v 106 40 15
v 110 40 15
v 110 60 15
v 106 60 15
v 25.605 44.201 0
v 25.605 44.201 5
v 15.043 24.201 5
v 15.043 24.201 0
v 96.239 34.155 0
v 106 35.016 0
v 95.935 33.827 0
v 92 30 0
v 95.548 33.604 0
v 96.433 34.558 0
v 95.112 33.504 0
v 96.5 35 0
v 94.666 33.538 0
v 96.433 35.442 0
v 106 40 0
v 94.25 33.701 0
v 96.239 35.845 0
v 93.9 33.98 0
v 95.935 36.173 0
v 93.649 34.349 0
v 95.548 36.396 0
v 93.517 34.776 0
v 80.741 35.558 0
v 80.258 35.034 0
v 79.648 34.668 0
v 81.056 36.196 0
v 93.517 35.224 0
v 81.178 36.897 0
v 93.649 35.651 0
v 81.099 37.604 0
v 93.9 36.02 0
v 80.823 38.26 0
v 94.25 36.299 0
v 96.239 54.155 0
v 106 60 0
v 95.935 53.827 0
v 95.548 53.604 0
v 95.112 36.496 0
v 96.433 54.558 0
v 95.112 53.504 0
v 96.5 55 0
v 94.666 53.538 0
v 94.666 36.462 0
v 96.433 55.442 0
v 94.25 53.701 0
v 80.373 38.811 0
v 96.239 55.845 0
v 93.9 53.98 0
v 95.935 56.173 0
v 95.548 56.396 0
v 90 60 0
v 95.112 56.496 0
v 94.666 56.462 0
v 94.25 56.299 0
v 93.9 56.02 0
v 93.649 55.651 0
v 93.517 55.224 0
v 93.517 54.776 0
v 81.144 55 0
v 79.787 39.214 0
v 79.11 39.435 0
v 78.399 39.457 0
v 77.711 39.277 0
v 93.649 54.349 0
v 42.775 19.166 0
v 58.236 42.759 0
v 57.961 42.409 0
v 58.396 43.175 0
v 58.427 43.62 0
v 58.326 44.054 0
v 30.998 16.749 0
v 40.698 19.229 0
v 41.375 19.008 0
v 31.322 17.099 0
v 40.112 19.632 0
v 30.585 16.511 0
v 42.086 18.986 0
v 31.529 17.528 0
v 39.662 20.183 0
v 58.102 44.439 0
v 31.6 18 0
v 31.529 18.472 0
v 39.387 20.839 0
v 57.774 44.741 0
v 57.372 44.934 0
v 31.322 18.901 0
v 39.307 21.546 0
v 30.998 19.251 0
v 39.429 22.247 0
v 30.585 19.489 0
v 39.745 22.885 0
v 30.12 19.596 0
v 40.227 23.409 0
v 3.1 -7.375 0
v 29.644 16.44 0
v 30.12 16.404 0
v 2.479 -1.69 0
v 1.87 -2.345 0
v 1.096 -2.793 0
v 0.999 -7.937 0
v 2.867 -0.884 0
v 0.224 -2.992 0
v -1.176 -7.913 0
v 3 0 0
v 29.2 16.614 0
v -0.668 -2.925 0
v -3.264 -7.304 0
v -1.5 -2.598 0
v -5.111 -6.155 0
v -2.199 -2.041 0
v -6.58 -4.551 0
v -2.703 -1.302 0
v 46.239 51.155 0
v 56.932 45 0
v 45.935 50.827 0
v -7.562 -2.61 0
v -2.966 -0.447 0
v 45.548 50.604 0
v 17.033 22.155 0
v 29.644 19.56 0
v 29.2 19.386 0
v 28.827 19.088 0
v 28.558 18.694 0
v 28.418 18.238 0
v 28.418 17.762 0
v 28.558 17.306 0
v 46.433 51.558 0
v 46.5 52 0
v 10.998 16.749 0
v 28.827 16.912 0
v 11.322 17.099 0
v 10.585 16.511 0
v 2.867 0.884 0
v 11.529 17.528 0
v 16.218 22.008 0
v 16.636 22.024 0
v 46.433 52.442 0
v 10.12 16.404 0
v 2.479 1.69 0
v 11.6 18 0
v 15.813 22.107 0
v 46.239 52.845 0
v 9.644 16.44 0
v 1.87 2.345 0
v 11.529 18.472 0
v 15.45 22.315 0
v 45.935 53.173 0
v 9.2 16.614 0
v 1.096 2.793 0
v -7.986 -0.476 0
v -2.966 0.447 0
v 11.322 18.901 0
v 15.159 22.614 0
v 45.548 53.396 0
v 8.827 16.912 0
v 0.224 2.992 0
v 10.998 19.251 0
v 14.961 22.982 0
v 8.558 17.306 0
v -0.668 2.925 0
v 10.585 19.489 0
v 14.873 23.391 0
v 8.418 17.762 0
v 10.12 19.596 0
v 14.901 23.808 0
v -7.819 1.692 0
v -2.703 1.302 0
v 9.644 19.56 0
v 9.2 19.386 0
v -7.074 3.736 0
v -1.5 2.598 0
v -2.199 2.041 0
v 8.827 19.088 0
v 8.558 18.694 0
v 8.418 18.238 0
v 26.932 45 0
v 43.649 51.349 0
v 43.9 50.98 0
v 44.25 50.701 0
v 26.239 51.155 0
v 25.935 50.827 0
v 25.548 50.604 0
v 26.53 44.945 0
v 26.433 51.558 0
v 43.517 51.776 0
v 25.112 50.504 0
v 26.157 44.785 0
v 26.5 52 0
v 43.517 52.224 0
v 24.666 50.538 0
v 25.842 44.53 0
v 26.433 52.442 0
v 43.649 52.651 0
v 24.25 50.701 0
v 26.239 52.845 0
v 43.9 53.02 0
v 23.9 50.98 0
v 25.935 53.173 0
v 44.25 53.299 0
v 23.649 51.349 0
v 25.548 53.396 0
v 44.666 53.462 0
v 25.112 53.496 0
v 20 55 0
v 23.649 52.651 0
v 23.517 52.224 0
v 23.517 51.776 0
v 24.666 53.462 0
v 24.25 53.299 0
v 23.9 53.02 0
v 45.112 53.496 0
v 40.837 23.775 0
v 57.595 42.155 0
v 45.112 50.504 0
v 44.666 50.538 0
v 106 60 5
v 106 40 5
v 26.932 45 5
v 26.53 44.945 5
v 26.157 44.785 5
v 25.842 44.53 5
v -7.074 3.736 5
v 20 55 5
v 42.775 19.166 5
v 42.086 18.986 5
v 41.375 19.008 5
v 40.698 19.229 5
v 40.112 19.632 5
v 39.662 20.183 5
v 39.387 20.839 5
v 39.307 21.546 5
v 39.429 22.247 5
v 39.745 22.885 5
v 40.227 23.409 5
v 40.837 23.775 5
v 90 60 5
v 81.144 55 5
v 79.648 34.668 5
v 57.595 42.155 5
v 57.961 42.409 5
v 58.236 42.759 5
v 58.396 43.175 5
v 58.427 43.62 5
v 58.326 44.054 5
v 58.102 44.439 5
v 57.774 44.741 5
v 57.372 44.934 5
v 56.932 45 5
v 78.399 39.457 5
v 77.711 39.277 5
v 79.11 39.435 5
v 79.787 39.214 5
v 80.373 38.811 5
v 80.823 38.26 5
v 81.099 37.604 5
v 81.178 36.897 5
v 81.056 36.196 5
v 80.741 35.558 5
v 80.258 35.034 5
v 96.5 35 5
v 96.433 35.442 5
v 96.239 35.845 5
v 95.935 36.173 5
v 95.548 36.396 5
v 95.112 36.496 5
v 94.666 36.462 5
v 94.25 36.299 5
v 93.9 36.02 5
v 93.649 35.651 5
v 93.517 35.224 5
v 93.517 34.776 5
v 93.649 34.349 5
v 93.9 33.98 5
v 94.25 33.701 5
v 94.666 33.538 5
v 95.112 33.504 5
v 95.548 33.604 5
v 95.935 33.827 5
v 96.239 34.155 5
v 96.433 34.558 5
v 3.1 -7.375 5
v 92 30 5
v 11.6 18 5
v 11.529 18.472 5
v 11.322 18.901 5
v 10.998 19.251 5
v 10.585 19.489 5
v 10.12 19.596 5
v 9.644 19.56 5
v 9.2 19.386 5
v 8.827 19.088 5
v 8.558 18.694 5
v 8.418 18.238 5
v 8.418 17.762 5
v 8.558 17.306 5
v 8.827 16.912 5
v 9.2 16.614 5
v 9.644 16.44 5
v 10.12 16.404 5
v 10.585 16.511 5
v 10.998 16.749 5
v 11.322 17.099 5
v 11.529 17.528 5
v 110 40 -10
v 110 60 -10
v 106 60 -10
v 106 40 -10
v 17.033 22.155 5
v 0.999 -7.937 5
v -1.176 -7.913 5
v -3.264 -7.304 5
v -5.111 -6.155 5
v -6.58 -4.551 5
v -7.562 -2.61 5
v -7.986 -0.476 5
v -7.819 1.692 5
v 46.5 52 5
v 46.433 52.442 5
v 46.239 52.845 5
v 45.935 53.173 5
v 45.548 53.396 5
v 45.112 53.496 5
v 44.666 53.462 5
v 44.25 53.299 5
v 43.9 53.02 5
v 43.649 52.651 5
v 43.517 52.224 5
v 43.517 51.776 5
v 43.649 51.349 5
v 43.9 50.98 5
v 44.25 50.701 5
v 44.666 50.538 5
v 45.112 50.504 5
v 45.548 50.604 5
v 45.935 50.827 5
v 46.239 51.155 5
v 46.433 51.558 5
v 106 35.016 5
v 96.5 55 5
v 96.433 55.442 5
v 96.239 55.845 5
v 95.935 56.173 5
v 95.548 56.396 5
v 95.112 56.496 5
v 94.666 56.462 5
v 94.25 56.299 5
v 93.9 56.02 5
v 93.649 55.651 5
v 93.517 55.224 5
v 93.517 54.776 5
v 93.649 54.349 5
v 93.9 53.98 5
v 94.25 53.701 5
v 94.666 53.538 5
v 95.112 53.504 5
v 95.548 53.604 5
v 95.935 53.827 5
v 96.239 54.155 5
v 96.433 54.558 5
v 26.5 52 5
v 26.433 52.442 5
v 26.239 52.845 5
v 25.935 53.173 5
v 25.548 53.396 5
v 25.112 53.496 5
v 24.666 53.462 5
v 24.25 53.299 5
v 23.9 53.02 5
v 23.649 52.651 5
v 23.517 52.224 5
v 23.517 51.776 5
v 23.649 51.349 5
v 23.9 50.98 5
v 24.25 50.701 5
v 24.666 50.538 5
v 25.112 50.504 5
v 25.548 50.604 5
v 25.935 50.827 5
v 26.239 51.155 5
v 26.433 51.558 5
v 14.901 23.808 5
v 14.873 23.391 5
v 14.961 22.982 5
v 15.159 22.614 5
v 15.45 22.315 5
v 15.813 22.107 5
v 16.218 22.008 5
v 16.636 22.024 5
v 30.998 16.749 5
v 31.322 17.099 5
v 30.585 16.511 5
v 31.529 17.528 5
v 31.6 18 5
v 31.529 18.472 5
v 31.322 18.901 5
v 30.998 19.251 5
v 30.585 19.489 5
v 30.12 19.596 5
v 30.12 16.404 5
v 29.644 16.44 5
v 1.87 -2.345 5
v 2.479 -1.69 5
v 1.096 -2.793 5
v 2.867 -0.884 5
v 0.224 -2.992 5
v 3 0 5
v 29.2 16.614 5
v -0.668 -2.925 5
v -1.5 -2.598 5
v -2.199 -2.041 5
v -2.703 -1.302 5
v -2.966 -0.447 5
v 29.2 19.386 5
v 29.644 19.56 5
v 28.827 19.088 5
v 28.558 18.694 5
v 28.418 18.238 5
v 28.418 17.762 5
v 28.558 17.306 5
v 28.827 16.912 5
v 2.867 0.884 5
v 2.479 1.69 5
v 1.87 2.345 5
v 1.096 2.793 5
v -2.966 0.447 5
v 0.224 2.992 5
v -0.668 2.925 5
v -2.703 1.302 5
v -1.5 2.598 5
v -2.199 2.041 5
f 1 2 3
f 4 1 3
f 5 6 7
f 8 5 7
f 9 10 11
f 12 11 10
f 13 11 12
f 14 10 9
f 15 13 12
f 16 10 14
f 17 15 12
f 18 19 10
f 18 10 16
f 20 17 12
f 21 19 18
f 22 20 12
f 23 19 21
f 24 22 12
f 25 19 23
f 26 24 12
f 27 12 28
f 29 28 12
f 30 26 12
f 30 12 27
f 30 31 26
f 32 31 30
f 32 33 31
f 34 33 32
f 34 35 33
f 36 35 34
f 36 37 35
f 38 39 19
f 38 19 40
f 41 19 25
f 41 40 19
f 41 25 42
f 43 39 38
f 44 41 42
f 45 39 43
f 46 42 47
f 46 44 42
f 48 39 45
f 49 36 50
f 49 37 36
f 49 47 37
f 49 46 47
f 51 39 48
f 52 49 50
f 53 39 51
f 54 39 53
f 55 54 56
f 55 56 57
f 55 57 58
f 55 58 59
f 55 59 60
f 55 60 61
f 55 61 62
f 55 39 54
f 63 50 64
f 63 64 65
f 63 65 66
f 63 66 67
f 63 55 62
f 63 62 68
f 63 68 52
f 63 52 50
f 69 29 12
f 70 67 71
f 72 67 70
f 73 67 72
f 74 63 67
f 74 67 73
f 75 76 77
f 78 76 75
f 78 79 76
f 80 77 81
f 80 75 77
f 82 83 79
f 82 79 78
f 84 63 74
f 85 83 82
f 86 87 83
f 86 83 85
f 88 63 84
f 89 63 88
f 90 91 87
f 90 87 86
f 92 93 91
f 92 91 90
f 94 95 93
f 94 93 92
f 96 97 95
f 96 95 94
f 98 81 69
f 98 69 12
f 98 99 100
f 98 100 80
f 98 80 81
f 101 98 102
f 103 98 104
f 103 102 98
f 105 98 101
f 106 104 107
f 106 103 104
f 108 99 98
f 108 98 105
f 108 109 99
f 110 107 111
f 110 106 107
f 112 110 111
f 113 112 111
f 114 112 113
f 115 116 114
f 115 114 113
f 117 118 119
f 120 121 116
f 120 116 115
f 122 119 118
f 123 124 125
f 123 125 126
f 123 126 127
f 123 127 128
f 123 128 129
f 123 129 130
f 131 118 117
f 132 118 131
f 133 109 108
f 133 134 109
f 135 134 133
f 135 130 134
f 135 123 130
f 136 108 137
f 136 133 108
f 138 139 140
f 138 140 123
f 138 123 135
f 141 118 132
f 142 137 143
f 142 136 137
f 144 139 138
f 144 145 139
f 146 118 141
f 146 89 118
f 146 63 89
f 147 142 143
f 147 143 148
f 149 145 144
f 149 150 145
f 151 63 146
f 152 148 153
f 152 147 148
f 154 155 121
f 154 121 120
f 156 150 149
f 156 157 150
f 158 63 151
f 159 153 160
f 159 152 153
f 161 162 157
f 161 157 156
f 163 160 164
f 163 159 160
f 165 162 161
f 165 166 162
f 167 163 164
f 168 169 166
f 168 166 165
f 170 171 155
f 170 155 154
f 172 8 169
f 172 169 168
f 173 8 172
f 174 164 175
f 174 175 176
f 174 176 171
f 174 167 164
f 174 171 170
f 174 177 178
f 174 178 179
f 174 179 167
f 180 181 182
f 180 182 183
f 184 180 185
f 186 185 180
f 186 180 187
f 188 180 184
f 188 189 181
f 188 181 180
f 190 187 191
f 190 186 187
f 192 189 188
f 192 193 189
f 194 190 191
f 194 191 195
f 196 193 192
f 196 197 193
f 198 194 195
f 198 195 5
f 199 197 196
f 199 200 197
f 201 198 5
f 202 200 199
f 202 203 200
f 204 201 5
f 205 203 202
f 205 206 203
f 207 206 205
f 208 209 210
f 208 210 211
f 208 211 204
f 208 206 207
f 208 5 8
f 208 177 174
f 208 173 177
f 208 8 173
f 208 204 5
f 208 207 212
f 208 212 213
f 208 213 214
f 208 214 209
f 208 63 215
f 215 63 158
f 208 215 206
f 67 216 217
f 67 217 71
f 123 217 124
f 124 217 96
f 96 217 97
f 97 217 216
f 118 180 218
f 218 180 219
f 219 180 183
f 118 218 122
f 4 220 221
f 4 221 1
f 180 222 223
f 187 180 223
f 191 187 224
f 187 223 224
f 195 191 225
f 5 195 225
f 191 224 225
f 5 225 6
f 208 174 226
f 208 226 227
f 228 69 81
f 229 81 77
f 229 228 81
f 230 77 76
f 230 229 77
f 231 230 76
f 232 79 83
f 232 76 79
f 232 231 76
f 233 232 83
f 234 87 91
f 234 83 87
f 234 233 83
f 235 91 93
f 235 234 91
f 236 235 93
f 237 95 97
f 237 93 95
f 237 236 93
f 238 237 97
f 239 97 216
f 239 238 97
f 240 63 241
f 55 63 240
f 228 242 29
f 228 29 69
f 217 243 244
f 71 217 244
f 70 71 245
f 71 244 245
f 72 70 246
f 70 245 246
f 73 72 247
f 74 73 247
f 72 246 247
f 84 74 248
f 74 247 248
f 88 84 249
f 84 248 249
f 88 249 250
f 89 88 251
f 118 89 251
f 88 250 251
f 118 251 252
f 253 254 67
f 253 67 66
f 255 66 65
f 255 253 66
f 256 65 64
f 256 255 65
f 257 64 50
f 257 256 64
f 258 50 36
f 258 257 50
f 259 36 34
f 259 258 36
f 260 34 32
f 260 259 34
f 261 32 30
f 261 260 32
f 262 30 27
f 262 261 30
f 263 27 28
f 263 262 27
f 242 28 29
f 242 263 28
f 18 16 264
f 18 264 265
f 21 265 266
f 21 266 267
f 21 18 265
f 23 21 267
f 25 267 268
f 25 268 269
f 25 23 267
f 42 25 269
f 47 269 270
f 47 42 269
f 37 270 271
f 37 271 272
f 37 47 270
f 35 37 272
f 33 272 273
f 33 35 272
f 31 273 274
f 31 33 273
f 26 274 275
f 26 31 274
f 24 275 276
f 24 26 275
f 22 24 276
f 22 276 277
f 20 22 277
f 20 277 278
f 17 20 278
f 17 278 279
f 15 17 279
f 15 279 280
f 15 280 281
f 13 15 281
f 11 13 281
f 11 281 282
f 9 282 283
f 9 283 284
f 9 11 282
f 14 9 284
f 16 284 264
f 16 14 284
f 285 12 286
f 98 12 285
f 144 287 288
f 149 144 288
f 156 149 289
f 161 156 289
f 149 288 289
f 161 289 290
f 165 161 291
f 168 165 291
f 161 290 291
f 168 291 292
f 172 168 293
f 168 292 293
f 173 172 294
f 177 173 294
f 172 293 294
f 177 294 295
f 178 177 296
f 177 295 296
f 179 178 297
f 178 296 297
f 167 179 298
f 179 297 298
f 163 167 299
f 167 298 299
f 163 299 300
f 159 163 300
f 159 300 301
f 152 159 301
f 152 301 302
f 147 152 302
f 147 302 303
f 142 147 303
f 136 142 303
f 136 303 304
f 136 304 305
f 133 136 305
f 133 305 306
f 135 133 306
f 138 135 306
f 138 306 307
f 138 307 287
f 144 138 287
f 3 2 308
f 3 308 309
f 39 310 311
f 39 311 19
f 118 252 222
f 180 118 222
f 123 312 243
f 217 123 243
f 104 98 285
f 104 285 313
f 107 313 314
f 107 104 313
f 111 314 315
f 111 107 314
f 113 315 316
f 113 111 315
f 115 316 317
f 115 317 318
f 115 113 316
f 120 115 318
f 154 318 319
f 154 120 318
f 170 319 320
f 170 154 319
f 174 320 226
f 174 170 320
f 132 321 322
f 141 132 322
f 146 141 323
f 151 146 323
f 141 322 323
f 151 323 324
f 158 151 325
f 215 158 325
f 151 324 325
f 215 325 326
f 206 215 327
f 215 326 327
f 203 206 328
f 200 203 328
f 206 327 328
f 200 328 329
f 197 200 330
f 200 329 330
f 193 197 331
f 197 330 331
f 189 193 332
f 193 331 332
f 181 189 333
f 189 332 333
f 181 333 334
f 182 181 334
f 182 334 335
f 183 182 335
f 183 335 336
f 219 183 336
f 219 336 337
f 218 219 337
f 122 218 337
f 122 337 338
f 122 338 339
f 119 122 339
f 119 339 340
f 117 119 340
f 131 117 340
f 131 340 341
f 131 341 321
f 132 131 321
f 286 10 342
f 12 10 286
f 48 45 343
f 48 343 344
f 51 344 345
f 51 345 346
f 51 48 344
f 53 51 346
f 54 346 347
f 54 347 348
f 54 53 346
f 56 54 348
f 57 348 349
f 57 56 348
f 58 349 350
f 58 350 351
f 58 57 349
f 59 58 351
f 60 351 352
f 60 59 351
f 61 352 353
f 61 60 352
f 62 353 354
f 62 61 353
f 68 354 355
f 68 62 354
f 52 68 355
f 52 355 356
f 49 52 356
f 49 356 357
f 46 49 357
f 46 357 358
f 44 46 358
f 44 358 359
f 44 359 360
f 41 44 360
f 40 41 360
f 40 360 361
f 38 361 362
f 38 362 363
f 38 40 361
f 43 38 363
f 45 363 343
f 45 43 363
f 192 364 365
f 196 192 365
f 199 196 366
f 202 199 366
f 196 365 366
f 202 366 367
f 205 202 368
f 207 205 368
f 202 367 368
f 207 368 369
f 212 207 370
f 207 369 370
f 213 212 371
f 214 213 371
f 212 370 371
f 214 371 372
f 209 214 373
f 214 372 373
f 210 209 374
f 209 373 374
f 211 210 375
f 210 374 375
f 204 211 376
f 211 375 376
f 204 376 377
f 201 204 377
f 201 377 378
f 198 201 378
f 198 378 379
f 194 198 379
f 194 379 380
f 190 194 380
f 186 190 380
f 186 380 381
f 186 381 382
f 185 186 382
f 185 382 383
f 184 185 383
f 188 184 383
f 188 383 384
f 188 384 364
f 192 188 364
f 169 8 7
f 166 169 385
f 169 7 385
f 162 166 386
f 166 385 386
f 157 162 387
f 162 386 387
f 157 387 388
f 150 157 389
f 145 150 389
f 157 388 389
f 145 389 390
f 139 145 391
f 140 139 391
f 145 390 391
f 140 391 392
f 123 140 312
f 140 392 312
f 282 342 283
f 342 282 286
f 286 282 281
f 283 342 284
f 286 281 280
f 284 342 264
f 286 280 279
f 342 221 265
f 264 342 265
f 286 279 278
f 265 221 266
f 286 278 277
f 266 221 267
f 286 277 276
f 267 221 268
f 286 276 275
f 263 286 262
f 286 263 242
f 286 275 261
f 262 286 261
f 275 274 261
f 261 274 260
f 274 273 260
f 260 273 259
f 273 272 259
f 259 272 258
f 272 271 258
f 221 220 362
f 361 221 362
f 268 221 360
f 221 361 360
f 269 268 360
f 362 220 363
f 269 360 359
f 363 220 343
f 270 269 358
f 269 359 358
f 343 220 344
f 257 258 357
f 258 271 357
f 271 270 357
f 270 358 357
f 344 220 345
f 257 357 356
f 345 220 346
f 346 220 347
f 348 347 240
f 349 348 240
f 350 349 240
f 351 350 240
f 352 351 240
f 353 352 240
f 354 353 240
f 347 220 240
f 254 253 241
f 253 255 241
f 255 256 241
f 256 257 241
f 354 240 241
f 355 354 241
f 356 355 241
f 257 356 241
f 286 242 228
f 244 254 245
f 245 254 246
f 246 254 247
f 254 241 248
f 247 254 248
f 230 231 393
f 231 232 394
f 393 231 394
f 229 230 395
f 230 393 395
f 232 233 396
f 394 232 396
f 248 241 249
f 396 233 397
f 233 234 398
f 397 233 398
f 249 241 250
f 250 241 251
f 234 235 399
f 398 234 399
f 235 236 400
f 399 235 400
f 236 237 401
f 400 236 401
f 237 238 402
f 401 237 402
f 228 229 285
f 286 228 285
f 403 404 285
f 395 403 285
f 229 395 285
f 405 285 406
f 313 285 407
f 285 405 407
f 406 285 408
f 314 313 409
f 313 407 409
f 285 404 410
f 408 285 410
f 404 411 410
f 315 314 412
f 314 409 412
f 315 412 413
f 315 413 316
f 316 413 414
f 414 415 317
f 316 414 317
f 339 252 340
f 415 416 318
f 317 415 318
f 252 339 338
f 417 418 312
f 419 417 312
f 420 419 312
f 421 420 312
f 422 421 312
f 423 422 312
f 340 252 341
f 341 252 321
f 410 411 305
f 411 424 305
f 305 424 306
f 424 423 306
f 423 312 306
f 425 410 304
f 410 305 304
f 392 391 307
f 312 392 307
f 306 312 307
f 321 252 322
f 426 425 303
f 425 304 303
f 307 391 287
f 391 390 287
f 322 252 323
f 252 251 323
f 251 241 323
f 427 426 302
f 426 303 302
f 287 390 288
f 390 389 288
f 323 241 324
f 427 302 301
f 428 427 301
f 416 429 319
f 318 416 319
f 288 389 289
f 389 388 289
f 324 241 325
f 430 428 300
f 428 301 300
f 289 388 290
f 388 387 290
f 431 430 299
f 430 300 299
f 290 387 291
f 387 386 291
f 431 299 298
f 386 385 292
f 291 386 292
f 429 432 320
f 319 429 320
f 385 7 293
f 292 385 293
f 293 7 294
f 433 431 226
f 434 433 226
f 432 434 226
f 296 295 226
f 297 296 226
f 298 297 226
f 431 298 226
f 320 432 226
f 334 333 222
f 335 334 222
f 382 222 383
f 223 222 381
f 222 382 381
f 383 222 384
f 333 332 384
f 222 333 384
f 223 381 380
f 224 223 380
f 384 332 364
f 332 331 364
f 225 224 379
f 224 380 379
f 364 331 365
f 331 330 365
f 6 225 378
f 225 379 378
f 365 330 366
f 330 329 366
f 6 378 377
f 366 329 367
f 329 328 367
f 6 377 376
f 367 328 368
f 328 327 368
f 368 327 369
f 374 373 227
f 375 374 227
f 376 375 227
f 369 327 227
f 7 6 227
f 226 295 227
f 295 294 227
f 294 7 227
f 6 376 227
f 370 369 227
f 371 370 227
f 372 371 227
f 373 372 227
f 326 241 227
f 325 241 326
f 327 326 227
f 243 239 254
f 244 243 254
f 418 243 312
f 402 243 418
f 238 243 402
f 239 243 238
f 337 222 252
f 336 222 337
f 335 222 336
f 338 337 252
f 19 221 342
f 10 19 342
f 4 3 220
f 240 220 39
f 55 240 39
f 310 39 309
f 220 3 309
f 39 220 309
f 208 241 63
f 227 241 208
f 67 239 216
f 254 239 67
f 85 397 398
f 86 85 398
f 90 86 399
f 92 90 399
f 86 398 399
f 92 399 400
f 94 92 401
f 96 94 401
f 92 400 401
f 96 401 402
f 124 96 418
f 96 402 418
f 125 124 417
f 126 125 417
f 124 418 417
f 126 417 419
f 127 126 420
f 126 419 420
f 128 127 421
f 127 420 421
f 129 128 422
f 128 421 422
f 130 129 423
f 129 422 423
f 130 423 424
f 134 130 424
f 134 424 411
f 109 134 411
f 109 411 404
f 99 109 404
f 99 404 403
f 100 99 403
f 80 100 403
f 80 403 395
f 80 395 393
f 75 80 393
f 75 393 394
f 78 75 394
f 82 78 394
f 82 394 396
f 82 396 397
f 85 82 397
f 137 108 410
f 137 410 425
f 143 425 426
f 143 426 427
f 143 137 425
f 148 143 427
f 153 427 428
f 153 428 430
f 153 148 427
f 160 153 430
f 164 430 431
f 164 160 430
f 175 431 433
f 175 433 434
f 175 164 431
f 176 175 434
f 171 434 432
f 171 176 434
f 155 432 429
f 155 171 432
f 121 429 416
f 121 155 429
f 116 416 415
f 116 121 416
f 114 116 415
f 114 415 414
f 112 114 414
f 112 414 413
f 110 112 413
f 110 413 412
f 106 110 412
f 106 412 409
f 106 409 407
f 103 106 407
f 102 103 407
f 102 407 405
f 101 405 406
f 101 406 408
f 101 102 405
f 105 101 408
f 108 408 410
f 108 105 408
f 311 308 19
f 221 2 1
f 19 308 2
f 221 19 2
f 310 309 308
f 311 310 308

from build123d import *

# Parameters (mm, degrees)
SKETCH_1_R               = 3
SKETCH_1_R_2             = 1.5
EXTRUDE_1_DEPTH          = 5
EXTRUDE_2_DEPTH          = 5
SKETCH_4_R               = 1.5
CUT_EXTRUDE_1_DEPTH      = 144.265487819
EXTRUDE_START            = -5
EXTRUDE_3_DEPTH          = 5
CUT_EXTRUDE_2_DEPTH      = 144.265487819
SKETCH_7_R               = 1.6
CUT_EXTRUDE_3_DEPTH      = 144.265487819
EXTRUDE_4_DEPTH          = 24
CUT_EXTRUDE_4_DEPTH      = 10
CUT_EXTRUDE_4_DEPTH_BACK = 144.961800489
CUT_EXTRUDE_5_DEPTH      = 144.961800489
SKETCH_14_W              = 9.91097982
SKETCH_14_H              = 20
SKETCH_14_W_2            = 10.08902018
CUT_EXTRUDE_7_DEPTH      = 146.344418537


with BuildPart() as part:
    # 草图1 → 凸台-拉伸1 (new body)
    with BuildSketch(Plane.XY):
        with BuildLine():
            Line((-3.933140204, 6.966376973), (90, 60))
            Line((90, 60), (130, 60))
            Line((130, 60), (130, 30))
            Line((130, 30), (92, 30))
            Line((92, 30), (3.100465808, -7.374761811))
            ThreePointArc((3.100465808, -7.374761811), (-7.182645896, -3.522725923), (-3.933140204, 6.966376973))
        make_face()
        Circle(SKETCH_1_R, mode=Mode.SUBTRACT)
        with Locations((95, 55)):
            Circle(SKETCH_1_R_2, mode=Mode.SUBTRACT)
        with Locations((125, 55)):
            Circle(SKETCH_1_R_2, mode=Mode.SUBTRACT)
        with Locations((125, 35)):
            Circle(SKETCH_1_R_2, mode=Mode.SUBTRACT)
        with Locations((95, 35)):
            Circle(SKETCH_1_R_2, mode=Mode.SUBTRACT)
    extrude(amount=EXTRUDE_1_DEPTH)

    # 草图3 → 凸台-拉伸2 (add)
    with BuildSketch(Plane.XY.offset(5)):
        Polygon((81.144001216, 55), (20, 55), (20, 20.478766027), align=None)
    extrude(amount=-EXTRUDE_2_DEPTH)

    # 草图4 → 切除-拉伸1 (cut, through all)
    with BuildSketch(Plane.XY.offset(5)):
        with Locations((25, 52)):
            Circle(SKETCH_4_R)
        with Locations((45, 52)):
            Circle(SKETCH_4_R)
    extrude(amount=-CUT_EXTRUDE_1_DEPTH, mode=Mode.SUBTRACT)

    # 草图6 → 凸台-拉伸3 (add)
    with BuildSketch(Plane.XY.offset(5).offset(EXTRUDE_START)):
        with BuildLine():
            Line((-7.074049095, 3.736017853), (20, 55))
            Line((20, 55), (20, 20.478766027))
            Line((20, 20.478766027), (-3.933140204, 6.966376973))
            ThreePointArc((-3.933140204, 6.966376973), (-5.735709118, 5.576884517), (-7.074049095, 3.736017853))
        make_face()
    extrude(amount=EXTRUDE_3_DEPTH)

    # 草图5 → 切除-拉伸2 (cut, through all)
    with BuildSketch(Plane.XY.offset(5)):
        with BuildLine():
            Line((25.605401824, 44.200503347), (15.042800964, 24.200503347))
            ThreePointArc((15.042800964, 24.200503347), (15.293877797, 22.454192152), (17.032531201, 22.154647985))
            Line((17.032531201, 22.154647985), (57.595132061, 42.154647985))
            ThreePointArc((57.595132061, 42.154647985), (58.392612512, 43.840567158), (56.93178603, 45))
            Line((56.93178603, 45), (26.93178603, 45))
            ThreePointArc((26.93178603, 45), (26.157433081, 44.784670195), (25.605401824, 44.200503347))
        make_face()
    extrude(amount=-CUT_EXTRUDE_2_DEPTH, mode=Mode.SUBTRACT)

    # 草图7 → 切除-拉伸3 (cut, through all)
    with BuildSketch(Plane.XY.offset(5)):
        with Locations((10, 18)):
            Circle(SKETCH_7_R)
        with Locations((30, 18)):
            Circle(SKETCH_7_R)
    extrude(amount=-CUT_EXTRUDE_3_DEPTH, mode=Mode.SUBTRACT)

    # 草图8 → 凸台-拉伸4 (add)
    with BuildSketch(Plane(origin=(130, 0, 0), x_dir=(0, 0, -1), z_dir=(1, 0, 0))):
        Polygon((0, 30), (-5, 30), (-15, 30), (-15, 60), (10, 60), (10, 30), align=None)
    extrude(amount=-EXTRUDE_4_DEPTH)

    # 草图10 → 切除-拉伸4 (cut, two sides: drawn at the far end of the back side and taken through both)
    with BuildSketch(Plane.XY.offset(5).offset(-CUT_EXTRUDE_4_DEPTH_BACK)):
        Polygon((130, 30), (130, 40), (119.91097982, 40), (92, 30), align=None)
    extrude(amount=CUT_EXTRUDE_4_DEPTH + CUT_EXTRUDE_4_DEPTH_BACK, mode=Mode.SUBTRACT)

    # 草图12 → 切除-拉伸5 (cut, through all)
    with BuildSketch(Plane.XY.offset(5)):
        with BuildLine():
            Line((40.836799147, 23.774924451), (77.710608203, 39.277253491))
            ThreePointArc((77.710608203, 39.277253491), (80.984116834, 37.94153599), (79.648399333, 34.668027359))
            Line((79.648399333, 34.668027359), (42.774590277, 19.165698319))
            ThreePointArc((42.774590277, 19.165698319), (39.501081646, 20.50141582), (40.836799147, 23.774924451))
        make_face()
    extrude(amount=-CUT_EXTRUDE_5_DEPTH, mode=Mode.SUBTRACT)

    # 草图14 → 切除-拉伸7 (cut, through all)
    with BuildSketch(Plane.XY.offset(15)):
        Polygon((106, 35.015947161), (119.91097982, 40), (110, 40), (106, 40), align=None)
        with Locations((114.95548991, 50)):
            Rectangle(SKETCH_14_W, SKETCH_14_H)
        with Locations((124.95548991, 50)):
            Rectangle(SKETCH_14_W_2, SKETCH_14_H)
    extrude(amount=-CUT_EXTRUDE_7_DEPTH, mode=Mode.SUBTRACT)


solid = part.part
